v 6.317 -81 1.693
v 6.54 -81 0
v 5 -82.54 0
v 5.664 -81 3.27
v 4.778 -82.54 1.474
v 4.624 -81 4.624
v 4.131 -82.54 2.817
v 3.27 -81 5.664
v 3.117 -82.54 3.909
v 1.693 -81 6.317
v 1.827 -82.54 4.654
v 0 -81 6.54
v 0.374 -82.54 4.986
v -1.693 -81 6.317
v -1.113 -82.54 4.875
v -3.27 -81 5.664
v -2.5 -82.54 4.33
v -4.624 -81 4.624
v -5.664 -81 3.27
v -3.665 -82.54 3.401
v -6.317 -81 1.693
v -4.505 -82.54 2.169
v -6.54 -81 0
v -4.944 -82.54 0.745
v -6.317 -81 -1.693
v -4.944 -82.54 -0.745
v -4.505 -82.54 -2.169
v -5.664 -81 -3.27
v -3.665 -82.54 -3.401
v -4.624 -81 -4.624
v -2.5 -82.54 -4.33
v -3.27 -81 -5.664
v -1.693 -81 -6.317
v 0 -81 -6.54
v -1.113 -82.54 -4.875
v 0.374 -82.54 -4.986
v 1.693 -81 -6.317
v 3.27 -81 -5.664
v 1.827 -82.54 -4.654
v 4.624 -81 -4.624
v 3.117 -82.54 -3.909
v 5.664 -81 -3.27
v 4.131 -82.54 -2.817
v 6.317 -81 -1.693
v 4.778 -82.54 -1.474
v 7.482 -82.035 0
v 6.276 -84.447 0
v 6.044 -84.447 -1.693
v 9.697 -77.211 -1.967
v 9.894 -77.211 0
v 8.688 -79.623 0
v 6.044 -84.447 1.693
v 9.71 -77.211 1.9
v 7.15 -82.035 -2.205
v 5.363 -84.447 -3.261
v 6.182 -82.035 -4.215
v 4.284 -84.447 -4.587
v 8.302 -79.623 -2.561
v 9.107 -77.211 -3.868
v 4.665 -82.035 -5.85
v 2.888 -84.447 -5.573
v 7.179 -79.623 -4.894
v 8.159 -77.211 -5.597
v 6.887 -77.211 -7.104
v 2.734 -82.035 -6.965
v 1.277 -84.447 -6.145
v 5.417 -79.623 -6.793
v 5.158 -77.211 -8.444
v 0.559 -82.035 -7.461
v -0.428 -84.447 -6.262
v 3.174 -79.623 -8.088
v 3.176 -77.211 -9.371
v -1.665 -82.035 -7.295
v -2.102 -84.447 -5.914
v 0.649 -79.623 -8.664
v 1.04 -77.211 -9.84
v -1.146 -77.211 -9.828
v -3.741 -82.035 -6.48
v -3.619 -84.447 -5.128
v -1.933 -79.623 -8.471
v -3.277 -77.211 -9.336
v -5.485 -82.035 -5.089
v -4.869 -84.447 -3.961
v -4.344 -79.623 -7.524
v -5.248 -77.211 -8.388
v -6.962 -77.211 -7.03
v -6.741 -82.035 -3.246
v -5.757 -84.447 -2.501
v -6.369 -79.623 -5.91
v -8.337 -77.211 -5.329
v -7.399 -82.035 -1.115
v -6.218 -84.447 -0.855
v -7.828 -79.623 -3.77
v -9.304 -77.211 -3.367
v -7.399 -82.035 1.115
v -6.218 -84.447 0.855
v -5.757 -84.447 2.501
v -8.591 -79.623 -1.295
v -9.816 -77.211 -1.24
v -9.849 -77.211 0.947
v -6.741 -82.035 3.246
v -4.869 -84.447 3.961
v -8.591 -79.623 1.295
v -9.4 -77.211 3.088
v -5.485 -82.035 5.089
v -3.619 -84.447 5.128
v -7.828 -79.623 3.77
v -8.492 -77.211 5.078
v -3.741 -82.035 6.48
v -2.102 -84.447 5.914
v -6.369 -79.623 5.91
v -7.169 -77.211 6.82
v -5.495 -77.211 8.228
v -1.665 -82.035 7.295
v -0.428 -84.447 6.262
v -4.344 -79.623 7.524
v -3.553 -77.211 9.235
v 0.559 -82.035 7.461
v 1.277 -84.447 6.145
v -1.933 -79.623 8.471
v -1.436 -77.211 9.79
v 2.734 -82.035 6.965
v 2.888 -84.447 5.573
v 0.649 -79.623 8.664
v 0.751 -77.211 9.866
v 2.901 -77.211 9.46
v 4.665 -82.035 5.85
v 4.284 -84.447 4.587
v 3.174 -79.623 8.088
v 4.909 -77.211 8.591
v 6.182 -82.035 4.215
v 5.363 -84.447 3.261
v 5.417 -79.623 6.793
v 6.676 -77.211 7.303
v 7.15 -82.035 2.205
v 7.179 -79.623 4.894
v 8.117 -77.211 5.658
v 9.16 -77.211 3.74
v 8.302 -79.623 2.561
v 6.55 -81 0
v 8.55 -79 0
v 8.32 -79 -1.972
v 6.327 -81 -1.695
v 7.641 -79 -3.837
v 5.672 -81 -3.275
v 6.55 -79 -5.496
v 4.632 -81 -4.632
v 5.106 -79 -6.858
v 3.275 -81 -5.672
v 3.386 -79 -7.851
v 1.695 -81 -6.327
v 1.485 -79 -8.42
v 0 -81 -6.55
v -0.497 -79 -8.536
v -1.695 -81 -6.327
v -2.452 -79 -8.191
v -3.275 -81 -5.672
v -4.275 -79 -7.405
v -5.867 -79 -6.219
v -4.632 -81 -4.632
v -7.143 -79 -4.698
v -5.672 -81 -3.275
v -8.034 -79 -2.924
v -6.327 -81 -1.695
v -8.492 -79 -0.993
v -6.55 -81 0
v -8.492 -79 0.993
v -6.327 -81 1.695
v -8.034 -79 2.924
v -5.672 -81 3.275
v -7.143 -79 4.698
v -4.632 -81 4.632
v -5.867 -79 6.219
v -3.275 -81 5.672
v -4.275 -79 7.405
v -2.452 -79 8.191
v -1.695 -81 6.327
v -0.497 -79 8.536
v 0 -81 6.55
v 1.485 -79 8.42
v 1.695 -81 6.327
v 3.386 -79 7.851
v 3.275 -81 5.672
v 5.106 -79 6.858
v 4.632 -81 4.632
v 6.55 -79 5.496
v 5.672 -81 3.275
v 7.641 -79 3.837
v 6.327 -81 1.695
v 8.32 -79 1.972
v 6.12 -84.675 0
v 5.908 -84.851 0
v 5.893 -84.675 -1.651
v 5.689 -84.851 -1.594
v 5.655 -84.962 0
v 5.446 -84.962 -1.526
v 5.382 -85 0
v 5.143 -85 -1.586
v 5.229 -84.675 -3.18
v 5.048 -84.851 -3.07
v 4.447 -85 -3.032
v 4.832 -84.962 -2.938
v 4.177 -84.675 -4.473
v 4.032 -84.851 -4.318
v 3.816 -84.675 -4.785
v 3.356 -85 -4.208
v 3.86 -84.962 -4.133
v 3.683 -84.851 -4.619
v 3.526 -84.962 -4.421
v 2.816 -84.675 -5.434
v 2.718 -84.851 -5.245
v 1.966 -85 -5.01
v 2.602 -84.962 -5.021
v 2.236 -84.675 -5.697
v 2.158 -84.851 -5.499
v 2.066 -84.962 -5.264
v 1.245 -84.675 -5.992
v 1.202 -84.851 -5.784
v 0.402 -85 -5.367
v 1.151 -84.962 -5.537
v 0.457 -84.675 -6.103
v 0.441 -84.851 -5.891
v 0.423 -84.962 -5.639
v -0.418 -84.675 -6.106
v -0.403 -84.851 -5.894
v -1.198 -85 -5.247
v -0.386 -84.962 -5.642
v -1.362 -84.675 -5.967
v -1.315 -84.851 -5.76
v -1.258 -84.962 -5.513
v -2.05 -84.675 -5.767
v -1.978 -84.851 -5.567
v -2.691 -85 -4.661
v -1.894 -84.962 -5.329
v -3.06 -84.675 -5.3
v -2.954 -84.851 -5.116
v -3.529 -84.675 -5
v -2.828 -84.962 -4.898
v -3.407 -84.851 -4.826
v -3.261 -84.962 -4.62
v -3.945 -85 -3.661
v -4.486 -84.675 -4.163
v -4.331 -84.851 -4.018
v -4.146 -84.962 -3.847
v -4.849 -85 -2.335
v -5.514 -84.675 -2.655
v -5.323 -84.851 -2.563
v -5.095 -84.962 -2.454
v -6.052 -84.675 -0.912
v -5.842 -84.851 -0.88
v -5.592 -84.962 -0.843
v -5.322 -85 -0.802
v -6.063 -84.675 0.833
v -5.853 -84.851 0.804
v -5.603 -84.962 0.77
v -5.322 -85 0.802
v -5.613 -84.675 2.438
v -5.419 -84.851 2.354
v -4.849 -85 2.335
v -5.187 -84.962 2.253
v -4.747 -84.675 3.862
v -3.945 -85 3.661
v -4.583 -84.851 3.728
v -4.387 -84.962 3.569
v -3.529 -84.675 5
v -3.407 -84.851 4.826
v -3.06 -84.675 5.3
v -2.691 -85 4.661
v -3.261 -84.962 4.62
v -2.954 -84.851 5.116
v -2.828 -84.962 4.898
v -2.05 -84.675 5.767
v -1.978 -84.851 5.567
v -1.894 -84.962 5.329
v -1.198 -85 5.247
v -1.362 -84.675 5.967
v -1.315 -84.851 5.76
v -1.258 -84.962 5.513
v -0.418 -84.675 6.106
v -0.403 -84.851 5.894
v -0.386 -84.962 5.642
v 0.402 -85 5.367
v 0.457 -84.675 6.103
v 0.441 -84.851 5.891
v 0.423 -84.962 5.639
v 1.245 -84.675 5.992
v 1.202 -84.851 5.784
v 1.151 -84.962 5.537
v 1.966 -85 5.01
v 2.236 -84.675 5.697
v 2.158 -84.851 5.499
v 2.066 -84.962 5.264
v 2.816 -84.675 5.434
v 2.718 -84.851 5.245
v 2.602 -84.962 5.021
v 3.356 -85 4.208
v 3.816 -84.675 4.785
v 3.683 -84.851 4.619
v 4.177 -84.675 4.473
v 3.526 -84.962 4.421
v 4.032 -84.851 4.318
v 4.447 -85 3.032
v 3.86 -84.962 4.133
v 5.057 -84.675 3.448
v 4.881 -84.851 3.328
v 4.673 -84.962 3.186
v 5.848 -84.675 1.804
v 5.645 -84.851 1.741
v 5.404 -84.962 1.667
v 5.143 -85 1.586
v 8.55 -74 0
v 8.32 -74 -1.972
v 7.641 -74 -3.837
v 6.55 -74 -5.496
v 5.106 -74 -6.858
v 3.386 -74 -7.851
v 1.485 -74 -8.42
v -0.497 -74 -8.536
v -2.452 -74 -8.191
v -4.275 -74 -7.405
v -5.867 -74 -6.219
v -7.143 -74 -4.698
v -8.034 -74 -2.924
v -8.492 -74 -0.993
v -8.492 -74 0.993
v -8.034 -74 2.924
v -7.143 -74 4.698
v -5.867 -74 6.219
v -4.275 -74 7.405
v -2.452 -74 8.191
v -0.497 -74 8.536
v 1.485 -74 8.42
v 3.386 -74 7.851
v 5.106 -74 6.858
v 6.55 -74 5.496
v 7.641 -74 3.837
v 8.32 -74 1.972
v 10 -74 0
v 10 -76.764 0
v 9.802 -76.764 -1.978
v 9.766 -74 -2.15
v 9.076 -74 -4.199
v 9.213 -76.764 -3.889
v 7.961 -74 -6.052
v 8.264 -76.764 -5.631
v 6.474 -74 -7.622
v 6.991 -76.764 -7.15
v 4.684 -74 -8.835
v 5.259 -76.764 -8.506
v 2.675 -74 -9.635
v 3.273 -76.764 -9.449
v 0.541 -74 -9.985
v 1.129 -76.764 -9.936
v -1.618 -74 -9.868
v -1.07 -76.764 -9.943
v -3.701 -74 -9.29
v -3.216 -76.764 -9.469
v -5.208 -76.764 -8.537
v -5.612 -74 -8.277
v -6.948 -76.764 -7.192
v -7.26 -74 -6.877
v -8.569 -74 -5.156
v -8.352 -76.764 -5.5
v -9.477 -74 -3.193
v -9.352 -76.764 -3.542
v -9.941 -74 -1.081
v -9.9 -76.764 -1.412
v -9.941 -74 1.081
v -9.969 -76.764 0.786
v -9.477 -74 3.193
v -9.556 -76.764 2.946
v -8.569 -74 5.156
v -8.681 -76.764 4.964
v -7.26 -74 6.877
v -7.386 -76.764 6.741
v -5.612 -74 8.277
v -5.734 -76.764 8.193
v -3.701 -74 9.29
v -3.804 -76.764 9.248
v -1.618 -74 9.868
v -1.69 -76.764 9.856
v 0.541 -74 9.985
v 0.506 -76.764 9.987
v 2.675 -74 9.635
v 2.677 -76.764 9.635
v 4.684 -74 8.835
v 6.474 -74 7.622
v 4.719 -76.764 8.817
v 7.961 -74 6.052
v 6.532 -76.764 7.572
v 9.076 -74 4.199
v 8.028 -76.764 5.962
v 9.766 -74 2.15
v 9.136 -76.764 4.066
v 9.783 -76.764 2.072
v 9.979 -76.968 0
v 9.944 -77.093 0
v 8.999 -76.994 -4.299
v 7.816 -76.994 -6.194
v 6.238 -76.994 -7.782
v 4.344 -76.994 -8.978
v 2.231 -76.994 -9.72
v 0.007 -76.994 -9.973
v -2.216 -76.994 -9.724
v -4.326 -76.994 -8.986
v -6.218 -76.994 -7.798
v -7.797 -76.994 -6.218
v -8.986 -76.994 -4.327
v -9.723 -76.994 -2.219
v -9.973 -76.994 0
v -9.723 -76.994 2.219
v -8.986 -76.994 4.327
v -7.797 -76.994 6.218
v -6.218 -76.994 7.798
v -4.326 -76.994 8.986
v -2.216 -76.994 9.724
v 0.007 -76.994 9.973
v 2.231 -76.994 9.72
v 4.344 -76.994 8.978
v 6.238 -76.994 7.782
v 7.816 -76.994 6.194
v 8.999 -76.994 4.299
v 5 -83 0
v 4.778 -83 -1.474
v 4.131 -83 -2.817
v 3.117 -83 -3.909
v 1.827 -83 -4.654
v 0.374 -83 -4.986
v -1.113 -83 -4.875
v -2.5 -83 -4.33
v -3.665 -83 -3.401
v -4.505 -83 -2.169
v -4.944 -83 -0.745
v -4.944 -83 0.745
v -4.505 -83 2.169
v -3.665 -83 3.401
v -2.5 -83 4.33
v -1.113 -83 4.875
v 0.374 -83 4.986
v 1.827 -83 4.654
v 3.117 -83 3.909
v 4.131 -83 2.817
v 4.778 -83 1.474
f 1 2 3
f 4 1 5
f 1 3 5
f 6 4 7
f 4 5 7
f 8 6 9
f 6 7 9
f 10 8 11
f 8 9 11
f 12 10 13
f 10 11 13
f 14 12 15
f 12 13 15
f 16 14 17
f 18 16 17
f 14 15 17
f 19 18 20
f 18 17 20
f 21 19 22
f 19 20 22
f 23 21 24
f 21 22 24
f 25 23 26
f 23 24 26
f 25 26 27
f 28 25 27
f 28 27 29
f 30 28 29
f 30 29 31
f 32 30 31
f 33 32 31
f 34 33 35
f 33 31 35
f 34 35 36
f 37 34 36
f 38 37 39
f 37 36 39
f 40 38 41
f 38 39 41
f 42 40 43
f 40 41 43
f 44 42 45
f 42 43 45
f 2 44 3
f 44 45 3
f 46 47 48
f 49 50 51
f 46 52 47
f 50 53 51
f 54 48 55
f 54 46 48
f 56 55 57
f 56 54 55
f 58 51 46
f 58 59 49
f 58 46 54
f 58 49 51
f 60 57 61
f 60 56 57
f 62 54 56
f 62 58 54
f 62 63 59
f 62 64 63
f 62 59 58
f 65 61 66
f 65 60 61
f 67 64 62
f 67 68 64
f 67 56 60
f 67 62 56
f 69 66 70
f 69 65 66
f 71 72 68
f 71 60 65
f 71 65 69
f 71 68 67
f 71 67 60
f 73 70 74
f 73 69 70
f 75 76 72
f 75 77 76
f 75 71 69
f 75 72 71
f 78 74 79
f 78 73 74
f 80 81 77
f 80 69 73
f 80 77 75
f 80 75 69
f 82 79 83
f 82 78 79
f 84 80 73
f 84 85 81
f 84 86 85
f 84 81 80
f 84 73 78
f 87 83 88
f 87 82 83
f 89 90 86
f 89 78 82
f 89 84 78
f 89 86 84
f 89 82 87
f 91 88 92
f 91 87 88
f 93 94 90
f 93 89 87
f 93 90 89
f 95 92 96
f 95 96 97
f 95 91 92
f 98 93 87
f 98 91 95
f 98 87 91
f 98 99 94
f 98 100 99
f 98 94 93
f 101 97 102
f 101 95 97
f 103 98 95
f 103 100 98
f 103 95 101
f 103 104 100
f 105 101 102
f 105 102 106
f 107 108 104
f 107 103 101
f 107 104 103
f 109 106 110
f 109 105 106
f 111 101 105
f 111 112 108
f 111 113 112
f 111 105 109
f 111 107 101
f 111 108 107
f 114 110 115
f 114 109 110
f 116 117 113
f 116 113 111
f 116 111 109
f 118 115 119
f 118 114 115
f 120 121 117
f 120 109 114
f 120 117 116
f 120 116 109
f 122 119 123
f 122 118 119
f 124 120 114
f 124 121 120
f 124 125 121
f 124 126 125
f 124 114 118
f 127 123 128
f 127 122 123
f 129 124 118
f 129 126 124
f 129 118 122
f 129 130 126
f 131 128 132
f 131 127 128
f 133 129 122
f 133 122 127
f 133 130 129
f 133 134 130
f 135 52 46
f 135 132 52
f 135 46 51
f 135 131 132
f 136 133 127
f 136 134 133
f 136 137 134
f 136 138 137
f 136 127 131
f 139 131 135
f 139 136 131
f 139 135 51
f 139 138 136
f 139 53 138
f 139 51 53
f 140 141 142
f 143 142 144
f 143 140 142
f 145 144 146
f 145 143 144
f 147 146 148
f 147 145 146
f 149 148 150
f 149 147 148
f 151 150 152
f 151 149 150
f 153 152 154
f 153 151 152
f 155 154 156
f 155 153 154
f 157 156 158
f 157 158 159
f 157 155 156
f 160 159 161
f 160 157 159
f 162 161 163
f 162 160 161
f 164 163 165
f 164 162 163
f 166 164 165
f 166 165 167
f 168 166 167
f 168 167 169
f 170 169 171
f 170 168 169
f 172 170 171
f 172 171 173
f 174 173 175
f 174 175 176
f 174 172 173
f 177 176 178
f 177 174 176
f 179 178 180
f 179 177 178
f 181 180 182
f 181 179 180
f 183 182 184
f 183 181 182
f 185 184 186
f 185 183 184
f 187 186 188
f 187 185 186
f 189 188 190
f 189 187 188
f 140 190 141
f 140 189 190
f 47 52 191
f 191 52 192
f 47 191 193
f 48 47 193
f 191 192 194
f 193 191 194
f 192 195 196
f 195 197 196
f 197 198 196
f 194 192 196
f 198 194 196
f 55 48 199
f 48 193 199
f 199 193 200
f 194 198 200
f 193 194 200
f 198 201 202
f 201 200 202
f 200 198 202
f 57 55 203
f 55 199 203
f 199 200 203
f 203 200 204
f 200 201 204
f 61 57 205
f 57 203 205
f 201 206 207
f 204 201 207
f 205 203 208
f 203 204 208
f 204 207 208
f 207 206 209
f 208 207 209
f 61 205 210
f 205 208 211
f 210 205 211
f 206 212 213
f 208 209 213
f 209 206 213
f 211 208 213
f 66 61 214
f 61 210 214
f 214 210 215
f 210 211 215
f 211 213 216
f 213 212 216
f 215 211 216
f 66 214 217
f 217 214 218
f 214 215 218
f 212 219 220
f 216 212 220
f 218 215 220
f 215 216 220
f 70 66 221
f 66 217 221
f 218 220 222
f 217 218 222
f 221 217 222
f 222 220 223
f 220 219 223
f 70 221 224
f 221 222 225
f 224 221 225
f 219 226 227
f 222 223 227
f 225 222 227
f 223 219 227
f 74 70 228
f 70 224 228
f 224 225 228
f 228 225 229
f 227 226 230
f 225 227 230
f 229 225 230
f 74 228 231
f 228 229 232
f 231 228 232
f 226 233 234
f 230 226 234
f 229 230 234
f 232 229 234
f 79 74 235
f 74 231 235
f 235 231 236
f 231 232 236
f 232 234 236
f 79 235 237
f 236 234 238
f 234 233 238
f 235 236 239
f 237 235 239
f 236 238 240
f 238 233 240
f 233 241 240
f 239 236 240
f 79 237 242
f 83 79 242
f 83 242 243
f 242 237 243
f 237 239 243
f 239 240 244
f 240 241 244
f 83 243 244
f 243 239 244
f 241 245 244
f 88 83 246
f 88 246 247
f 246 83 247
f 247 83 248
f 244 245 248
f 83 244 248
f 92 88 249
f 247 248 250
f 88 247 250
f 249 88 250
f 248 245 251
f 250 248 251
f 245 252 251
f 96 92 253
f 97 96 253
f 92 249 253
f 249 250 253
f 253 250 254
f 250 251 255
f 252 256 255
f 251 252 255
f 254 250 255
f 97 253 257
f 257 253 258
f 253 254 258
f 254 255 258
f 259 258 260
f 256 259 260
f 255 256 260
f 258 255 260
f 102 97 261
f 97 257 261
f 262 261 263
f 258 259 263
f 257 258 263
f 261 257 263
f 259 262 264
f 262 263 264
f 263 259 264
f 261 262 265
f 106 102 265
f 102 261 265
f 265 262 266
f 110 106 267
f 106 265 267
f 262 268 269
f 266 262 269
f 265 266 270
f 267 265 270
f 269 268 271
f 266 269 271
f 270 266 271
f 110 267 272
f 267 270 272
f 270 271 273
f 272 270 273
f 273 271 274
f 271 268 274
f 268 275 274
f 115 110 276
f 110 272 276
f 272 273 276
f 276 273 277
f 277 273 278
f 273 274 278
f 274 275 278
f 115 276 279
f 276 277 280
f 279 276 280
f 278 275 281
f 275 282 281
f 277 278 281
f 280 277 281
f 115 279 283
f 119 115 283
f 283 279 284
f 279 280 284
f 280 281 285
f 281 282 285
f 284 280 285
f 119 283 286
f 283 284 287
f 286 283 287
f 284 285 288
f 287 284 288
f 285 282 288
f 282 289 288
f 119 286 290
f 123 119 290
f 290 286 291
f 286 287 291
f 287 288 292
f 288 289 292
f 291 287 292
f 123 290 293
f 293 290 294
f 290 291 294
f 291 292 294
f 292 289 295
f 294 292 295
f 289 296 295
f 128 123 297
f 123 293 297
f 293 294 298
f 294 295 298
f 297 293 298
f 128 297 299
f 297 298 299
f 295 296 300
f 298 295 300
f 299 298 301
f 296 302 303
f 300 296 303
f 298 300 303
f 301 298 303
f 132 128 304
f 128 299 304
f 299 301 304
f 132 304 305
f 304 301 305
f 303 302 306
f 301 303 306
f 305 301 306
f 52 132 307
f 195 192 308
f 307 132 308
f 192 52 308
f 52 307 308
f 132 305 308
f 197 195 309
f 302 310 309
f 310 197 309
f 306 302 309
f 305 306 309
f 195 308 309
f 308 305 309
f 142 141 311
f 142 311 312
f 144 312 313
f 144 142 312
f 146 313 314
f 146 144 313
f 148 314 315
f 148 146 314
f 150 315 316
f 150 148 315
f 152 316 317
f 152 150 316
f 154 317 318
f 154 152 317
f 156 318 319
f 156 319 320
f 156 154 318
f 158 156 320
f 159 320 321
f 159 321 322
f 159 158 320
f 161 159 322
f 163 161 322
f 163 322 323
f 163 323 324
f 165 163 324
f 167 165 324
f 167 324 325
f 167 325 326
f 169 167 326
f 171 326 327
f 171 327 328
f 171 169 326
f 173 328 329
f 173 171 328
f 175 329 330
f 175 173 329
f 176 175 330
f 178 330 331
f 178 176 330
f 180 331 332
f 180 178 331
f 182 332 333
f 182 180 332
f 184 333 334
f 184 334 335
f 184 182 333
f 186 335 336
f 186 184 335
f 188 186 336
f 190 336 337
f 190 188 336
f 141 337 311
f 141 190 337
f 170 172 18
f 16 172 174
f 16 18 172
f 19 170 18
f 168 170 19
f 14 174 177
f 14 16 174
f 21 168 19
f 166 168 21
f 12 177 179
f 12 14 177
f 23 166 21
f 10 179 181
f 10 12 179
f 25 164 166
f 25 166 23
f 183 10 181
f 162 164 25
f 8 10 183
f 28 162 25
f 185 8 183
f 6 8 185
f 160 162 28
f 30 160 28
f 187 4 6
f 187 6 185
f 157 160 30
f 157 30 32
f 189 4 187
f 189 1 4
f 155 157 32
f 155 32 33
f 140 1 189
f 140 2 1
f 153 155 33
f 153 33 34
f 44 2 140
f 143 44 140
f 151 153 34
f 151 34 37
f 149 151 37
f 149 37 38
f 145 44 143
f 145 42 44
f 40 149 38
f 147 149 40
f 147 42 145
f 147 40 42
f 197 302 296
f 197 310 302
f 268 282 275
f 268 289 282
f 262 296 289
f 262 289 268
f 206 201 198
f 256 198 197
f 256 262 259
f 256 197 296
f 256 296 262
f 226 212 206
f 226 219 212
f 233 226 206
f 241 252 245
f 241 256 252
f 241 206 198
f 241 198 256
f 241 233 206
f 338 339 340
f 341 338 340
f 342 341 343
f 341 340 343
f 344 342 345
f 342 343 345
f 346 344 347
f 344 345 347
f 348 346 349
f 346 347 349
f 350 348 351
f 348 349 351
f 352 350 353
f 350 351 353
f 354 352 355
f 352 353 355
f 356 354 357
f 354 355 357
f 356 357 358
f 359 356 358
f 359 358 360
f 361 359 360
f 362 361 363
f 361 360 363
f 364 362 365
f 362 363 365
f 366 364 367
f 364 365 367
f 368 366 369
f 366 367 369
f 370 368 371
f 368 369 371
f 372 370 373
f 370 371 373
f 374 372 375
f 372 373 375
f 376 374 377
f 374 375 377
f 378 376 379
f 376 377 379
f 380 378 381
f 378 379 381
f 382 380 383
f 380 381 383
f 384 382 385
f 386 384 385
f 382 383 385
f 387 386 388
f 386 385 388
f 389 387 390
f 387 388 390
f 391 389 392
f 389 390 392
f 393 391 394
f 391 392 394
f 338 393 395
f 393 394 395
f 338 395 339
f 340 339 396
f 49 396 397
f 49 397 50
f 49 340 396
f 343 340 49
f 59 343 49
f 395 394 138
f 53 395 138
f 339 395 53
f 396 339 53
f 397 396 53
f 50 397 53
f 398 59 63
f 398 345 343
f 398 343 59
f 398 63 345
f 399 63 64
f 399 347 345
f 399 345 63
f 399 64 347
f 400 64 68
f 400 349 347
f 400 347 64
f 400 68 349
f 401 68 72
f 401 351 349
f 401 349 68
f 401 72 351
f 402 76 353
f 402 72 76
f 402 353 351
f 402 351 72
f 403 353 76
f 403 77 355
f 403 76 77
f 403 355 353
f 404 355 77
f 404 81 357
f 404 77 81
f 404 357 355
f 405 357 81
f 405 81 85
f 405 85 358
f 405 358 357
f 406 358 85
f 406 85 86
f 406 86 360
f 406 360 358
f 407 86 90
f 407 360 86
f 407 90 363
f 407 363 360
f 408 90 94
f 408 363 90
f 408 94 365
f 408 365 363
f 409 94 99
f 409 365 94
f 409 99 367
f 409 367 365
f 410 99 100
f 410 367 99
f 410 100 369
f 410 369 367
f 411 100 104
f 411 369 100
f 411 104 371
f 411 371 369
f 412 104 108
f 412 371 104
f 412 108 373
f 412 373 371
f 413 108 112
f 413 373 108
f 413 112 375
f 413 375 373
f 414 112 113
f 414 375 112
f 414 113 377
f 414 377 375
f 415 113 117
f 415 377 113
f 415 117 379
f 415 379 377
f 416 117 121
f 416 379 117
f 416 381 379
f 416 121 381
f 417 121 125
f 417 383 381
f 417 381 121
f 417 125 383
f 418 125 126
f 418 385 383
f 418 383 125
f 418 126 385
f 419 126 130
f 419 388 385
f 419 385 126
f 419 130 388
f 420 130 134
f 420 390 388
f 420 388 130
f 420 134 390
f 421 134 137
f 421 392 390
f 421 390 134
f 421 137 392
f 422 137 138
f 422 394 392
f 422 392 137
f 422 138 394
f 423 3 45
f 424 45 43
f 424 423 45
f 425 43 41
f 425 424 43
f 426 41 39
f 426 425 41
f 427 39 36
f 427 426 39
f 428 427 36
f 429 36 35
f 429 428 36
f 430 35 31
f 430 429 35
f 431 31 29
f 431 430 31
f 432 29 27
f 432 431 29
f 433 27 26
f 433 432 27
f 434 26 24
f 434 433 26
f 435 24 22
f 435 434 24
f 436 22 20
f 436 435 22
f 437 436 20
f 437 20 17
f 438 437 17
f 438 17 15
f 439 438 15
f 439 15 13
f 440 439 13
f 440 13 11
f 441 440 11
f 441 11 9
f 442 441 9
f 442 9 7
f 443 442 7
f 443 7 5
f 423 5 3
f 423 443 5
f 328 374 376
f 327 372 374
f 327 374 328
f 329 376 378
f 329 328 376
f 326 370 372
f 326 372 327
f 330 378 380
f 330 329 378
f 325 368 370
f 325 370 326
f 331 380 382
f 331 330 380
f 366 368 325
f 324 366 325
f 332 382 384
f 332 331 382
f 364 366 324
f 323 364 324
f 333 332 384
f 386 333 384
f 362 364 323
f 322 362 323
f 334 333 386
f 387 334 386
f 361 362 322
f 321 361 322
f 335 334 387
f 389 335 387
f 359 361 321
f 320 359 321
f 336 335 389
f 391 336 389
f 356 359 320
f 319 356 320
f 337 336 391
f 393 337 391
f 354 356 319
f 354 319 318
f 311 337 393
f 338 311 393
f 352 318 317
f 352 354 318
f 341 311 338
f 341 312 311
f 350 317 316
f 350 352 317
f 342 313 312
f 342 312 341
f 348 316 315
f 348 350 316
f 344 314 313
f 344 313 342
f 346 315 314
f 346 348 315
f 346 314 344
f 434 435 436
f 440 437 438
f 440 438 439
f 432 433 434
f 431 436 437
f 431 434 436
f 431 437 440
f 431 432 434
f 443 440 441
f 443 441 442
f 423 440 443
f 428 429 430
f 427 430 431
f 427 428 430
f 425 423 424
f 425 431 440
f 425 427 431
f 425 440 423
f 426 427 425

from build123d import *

# Parameters (mm, degrees)
CYLINDER119_R             = 5
CYLINDER119_DEPTH         = 7
CYLINDER118_R             = 8.55
CYLINDER118_DEPTH         = 7
CHAMFER005_SIZE           = 2
CYLINDER117_R             = 10
CYLINDER117_DEPTH         = 3
CHAMFER006_SIZE           = 1.54
FILLET006_R               = 1
FILLET006_PLACEMENT_ANGLE = 90


with BuildPart() as cylinder119:
    # Cylinder119 → Cylinder119 (new body)
    with BuildSketch(Plane.XY.offset(5)):
        Circle(CYLINDER119_R)
    extrude(amount=CYLINDER119_DEPTH)


with BuildPart() as fusion112:
    # Cylinder118 → Cylinder118 (new body)
    with BuildSketch(Plane.XY.offset(7)):
        Circle(CYLINDER118_R)
    extrude(amount=CYLINDER118_DEPTH)

    # Chamfer005
    chamfer005_edges = [fusion112.edges().sort_by_distance(p)[0] for p in [
        (-8.55, 0, 7),
    ]]
    chamfer(chamfer005_edges, length=CHAMFER005_SIZE)

    # Fusion112: union Cylinder119
    add(cylinder119.part)


with BuildPart() as cylinder117:
    # Cylinder117 → Cylinder117 (new body)
    with BuildSketch(Plane.XY.offset(11)):
        Circle(CYLINDER117_R)
    extrude(amount=CYLINDER117_DEPTH)


with BuildPart() as hub_wide_cap_left:
    # Cone → Cone (revolve)
    with BuildSketch(Plane(origin=(0, 0, 3), x_dir=(1, 0, 0), z_dir=(0, -1, 0))):
        Polygon((0, 0), (6, 0), (10, 8), (0, 8), align=None)
    revolve(axis=Axis((0, 0, 3), (0, 0, 1)))

    # Fusion111: union Cylinder117
    add(cylinder117.part)

    # Cut039: cut Fusion112
    add(fusion112.part, mode=Mode.SUBTRACT)

    # Chamfer006
    chamfer006_edges = [hub_wide_cap_left.edges().sort_by_distance(p)[0] for p in [
        (-5, 0, 7),
    ]]
    chamfer(chamfer006_edges, length=CHAMFER006_SIZE)

    # Fillet006
    fillet006_edges = [hub_wide_cap_left.edges().sort_by_distance(p)[0] for p in [
        (-10, 0, 11),
        (-6, 0, 3),
    ]]
    fillet(fillet006_edges, radius=FILLET006_R)


with BuildPart() as hub_wide_cap_left_1:
    # Fillet006 placement: moved
    add(hub_wide_cap_left.part.moved(Location((0, -88, 0))).rotate(Axis((0, -88, 0), (-1, 0, 0)), FILLET006_PLACEMENT_ANGLE))


solid = hub_wide_cap_left_1.part
